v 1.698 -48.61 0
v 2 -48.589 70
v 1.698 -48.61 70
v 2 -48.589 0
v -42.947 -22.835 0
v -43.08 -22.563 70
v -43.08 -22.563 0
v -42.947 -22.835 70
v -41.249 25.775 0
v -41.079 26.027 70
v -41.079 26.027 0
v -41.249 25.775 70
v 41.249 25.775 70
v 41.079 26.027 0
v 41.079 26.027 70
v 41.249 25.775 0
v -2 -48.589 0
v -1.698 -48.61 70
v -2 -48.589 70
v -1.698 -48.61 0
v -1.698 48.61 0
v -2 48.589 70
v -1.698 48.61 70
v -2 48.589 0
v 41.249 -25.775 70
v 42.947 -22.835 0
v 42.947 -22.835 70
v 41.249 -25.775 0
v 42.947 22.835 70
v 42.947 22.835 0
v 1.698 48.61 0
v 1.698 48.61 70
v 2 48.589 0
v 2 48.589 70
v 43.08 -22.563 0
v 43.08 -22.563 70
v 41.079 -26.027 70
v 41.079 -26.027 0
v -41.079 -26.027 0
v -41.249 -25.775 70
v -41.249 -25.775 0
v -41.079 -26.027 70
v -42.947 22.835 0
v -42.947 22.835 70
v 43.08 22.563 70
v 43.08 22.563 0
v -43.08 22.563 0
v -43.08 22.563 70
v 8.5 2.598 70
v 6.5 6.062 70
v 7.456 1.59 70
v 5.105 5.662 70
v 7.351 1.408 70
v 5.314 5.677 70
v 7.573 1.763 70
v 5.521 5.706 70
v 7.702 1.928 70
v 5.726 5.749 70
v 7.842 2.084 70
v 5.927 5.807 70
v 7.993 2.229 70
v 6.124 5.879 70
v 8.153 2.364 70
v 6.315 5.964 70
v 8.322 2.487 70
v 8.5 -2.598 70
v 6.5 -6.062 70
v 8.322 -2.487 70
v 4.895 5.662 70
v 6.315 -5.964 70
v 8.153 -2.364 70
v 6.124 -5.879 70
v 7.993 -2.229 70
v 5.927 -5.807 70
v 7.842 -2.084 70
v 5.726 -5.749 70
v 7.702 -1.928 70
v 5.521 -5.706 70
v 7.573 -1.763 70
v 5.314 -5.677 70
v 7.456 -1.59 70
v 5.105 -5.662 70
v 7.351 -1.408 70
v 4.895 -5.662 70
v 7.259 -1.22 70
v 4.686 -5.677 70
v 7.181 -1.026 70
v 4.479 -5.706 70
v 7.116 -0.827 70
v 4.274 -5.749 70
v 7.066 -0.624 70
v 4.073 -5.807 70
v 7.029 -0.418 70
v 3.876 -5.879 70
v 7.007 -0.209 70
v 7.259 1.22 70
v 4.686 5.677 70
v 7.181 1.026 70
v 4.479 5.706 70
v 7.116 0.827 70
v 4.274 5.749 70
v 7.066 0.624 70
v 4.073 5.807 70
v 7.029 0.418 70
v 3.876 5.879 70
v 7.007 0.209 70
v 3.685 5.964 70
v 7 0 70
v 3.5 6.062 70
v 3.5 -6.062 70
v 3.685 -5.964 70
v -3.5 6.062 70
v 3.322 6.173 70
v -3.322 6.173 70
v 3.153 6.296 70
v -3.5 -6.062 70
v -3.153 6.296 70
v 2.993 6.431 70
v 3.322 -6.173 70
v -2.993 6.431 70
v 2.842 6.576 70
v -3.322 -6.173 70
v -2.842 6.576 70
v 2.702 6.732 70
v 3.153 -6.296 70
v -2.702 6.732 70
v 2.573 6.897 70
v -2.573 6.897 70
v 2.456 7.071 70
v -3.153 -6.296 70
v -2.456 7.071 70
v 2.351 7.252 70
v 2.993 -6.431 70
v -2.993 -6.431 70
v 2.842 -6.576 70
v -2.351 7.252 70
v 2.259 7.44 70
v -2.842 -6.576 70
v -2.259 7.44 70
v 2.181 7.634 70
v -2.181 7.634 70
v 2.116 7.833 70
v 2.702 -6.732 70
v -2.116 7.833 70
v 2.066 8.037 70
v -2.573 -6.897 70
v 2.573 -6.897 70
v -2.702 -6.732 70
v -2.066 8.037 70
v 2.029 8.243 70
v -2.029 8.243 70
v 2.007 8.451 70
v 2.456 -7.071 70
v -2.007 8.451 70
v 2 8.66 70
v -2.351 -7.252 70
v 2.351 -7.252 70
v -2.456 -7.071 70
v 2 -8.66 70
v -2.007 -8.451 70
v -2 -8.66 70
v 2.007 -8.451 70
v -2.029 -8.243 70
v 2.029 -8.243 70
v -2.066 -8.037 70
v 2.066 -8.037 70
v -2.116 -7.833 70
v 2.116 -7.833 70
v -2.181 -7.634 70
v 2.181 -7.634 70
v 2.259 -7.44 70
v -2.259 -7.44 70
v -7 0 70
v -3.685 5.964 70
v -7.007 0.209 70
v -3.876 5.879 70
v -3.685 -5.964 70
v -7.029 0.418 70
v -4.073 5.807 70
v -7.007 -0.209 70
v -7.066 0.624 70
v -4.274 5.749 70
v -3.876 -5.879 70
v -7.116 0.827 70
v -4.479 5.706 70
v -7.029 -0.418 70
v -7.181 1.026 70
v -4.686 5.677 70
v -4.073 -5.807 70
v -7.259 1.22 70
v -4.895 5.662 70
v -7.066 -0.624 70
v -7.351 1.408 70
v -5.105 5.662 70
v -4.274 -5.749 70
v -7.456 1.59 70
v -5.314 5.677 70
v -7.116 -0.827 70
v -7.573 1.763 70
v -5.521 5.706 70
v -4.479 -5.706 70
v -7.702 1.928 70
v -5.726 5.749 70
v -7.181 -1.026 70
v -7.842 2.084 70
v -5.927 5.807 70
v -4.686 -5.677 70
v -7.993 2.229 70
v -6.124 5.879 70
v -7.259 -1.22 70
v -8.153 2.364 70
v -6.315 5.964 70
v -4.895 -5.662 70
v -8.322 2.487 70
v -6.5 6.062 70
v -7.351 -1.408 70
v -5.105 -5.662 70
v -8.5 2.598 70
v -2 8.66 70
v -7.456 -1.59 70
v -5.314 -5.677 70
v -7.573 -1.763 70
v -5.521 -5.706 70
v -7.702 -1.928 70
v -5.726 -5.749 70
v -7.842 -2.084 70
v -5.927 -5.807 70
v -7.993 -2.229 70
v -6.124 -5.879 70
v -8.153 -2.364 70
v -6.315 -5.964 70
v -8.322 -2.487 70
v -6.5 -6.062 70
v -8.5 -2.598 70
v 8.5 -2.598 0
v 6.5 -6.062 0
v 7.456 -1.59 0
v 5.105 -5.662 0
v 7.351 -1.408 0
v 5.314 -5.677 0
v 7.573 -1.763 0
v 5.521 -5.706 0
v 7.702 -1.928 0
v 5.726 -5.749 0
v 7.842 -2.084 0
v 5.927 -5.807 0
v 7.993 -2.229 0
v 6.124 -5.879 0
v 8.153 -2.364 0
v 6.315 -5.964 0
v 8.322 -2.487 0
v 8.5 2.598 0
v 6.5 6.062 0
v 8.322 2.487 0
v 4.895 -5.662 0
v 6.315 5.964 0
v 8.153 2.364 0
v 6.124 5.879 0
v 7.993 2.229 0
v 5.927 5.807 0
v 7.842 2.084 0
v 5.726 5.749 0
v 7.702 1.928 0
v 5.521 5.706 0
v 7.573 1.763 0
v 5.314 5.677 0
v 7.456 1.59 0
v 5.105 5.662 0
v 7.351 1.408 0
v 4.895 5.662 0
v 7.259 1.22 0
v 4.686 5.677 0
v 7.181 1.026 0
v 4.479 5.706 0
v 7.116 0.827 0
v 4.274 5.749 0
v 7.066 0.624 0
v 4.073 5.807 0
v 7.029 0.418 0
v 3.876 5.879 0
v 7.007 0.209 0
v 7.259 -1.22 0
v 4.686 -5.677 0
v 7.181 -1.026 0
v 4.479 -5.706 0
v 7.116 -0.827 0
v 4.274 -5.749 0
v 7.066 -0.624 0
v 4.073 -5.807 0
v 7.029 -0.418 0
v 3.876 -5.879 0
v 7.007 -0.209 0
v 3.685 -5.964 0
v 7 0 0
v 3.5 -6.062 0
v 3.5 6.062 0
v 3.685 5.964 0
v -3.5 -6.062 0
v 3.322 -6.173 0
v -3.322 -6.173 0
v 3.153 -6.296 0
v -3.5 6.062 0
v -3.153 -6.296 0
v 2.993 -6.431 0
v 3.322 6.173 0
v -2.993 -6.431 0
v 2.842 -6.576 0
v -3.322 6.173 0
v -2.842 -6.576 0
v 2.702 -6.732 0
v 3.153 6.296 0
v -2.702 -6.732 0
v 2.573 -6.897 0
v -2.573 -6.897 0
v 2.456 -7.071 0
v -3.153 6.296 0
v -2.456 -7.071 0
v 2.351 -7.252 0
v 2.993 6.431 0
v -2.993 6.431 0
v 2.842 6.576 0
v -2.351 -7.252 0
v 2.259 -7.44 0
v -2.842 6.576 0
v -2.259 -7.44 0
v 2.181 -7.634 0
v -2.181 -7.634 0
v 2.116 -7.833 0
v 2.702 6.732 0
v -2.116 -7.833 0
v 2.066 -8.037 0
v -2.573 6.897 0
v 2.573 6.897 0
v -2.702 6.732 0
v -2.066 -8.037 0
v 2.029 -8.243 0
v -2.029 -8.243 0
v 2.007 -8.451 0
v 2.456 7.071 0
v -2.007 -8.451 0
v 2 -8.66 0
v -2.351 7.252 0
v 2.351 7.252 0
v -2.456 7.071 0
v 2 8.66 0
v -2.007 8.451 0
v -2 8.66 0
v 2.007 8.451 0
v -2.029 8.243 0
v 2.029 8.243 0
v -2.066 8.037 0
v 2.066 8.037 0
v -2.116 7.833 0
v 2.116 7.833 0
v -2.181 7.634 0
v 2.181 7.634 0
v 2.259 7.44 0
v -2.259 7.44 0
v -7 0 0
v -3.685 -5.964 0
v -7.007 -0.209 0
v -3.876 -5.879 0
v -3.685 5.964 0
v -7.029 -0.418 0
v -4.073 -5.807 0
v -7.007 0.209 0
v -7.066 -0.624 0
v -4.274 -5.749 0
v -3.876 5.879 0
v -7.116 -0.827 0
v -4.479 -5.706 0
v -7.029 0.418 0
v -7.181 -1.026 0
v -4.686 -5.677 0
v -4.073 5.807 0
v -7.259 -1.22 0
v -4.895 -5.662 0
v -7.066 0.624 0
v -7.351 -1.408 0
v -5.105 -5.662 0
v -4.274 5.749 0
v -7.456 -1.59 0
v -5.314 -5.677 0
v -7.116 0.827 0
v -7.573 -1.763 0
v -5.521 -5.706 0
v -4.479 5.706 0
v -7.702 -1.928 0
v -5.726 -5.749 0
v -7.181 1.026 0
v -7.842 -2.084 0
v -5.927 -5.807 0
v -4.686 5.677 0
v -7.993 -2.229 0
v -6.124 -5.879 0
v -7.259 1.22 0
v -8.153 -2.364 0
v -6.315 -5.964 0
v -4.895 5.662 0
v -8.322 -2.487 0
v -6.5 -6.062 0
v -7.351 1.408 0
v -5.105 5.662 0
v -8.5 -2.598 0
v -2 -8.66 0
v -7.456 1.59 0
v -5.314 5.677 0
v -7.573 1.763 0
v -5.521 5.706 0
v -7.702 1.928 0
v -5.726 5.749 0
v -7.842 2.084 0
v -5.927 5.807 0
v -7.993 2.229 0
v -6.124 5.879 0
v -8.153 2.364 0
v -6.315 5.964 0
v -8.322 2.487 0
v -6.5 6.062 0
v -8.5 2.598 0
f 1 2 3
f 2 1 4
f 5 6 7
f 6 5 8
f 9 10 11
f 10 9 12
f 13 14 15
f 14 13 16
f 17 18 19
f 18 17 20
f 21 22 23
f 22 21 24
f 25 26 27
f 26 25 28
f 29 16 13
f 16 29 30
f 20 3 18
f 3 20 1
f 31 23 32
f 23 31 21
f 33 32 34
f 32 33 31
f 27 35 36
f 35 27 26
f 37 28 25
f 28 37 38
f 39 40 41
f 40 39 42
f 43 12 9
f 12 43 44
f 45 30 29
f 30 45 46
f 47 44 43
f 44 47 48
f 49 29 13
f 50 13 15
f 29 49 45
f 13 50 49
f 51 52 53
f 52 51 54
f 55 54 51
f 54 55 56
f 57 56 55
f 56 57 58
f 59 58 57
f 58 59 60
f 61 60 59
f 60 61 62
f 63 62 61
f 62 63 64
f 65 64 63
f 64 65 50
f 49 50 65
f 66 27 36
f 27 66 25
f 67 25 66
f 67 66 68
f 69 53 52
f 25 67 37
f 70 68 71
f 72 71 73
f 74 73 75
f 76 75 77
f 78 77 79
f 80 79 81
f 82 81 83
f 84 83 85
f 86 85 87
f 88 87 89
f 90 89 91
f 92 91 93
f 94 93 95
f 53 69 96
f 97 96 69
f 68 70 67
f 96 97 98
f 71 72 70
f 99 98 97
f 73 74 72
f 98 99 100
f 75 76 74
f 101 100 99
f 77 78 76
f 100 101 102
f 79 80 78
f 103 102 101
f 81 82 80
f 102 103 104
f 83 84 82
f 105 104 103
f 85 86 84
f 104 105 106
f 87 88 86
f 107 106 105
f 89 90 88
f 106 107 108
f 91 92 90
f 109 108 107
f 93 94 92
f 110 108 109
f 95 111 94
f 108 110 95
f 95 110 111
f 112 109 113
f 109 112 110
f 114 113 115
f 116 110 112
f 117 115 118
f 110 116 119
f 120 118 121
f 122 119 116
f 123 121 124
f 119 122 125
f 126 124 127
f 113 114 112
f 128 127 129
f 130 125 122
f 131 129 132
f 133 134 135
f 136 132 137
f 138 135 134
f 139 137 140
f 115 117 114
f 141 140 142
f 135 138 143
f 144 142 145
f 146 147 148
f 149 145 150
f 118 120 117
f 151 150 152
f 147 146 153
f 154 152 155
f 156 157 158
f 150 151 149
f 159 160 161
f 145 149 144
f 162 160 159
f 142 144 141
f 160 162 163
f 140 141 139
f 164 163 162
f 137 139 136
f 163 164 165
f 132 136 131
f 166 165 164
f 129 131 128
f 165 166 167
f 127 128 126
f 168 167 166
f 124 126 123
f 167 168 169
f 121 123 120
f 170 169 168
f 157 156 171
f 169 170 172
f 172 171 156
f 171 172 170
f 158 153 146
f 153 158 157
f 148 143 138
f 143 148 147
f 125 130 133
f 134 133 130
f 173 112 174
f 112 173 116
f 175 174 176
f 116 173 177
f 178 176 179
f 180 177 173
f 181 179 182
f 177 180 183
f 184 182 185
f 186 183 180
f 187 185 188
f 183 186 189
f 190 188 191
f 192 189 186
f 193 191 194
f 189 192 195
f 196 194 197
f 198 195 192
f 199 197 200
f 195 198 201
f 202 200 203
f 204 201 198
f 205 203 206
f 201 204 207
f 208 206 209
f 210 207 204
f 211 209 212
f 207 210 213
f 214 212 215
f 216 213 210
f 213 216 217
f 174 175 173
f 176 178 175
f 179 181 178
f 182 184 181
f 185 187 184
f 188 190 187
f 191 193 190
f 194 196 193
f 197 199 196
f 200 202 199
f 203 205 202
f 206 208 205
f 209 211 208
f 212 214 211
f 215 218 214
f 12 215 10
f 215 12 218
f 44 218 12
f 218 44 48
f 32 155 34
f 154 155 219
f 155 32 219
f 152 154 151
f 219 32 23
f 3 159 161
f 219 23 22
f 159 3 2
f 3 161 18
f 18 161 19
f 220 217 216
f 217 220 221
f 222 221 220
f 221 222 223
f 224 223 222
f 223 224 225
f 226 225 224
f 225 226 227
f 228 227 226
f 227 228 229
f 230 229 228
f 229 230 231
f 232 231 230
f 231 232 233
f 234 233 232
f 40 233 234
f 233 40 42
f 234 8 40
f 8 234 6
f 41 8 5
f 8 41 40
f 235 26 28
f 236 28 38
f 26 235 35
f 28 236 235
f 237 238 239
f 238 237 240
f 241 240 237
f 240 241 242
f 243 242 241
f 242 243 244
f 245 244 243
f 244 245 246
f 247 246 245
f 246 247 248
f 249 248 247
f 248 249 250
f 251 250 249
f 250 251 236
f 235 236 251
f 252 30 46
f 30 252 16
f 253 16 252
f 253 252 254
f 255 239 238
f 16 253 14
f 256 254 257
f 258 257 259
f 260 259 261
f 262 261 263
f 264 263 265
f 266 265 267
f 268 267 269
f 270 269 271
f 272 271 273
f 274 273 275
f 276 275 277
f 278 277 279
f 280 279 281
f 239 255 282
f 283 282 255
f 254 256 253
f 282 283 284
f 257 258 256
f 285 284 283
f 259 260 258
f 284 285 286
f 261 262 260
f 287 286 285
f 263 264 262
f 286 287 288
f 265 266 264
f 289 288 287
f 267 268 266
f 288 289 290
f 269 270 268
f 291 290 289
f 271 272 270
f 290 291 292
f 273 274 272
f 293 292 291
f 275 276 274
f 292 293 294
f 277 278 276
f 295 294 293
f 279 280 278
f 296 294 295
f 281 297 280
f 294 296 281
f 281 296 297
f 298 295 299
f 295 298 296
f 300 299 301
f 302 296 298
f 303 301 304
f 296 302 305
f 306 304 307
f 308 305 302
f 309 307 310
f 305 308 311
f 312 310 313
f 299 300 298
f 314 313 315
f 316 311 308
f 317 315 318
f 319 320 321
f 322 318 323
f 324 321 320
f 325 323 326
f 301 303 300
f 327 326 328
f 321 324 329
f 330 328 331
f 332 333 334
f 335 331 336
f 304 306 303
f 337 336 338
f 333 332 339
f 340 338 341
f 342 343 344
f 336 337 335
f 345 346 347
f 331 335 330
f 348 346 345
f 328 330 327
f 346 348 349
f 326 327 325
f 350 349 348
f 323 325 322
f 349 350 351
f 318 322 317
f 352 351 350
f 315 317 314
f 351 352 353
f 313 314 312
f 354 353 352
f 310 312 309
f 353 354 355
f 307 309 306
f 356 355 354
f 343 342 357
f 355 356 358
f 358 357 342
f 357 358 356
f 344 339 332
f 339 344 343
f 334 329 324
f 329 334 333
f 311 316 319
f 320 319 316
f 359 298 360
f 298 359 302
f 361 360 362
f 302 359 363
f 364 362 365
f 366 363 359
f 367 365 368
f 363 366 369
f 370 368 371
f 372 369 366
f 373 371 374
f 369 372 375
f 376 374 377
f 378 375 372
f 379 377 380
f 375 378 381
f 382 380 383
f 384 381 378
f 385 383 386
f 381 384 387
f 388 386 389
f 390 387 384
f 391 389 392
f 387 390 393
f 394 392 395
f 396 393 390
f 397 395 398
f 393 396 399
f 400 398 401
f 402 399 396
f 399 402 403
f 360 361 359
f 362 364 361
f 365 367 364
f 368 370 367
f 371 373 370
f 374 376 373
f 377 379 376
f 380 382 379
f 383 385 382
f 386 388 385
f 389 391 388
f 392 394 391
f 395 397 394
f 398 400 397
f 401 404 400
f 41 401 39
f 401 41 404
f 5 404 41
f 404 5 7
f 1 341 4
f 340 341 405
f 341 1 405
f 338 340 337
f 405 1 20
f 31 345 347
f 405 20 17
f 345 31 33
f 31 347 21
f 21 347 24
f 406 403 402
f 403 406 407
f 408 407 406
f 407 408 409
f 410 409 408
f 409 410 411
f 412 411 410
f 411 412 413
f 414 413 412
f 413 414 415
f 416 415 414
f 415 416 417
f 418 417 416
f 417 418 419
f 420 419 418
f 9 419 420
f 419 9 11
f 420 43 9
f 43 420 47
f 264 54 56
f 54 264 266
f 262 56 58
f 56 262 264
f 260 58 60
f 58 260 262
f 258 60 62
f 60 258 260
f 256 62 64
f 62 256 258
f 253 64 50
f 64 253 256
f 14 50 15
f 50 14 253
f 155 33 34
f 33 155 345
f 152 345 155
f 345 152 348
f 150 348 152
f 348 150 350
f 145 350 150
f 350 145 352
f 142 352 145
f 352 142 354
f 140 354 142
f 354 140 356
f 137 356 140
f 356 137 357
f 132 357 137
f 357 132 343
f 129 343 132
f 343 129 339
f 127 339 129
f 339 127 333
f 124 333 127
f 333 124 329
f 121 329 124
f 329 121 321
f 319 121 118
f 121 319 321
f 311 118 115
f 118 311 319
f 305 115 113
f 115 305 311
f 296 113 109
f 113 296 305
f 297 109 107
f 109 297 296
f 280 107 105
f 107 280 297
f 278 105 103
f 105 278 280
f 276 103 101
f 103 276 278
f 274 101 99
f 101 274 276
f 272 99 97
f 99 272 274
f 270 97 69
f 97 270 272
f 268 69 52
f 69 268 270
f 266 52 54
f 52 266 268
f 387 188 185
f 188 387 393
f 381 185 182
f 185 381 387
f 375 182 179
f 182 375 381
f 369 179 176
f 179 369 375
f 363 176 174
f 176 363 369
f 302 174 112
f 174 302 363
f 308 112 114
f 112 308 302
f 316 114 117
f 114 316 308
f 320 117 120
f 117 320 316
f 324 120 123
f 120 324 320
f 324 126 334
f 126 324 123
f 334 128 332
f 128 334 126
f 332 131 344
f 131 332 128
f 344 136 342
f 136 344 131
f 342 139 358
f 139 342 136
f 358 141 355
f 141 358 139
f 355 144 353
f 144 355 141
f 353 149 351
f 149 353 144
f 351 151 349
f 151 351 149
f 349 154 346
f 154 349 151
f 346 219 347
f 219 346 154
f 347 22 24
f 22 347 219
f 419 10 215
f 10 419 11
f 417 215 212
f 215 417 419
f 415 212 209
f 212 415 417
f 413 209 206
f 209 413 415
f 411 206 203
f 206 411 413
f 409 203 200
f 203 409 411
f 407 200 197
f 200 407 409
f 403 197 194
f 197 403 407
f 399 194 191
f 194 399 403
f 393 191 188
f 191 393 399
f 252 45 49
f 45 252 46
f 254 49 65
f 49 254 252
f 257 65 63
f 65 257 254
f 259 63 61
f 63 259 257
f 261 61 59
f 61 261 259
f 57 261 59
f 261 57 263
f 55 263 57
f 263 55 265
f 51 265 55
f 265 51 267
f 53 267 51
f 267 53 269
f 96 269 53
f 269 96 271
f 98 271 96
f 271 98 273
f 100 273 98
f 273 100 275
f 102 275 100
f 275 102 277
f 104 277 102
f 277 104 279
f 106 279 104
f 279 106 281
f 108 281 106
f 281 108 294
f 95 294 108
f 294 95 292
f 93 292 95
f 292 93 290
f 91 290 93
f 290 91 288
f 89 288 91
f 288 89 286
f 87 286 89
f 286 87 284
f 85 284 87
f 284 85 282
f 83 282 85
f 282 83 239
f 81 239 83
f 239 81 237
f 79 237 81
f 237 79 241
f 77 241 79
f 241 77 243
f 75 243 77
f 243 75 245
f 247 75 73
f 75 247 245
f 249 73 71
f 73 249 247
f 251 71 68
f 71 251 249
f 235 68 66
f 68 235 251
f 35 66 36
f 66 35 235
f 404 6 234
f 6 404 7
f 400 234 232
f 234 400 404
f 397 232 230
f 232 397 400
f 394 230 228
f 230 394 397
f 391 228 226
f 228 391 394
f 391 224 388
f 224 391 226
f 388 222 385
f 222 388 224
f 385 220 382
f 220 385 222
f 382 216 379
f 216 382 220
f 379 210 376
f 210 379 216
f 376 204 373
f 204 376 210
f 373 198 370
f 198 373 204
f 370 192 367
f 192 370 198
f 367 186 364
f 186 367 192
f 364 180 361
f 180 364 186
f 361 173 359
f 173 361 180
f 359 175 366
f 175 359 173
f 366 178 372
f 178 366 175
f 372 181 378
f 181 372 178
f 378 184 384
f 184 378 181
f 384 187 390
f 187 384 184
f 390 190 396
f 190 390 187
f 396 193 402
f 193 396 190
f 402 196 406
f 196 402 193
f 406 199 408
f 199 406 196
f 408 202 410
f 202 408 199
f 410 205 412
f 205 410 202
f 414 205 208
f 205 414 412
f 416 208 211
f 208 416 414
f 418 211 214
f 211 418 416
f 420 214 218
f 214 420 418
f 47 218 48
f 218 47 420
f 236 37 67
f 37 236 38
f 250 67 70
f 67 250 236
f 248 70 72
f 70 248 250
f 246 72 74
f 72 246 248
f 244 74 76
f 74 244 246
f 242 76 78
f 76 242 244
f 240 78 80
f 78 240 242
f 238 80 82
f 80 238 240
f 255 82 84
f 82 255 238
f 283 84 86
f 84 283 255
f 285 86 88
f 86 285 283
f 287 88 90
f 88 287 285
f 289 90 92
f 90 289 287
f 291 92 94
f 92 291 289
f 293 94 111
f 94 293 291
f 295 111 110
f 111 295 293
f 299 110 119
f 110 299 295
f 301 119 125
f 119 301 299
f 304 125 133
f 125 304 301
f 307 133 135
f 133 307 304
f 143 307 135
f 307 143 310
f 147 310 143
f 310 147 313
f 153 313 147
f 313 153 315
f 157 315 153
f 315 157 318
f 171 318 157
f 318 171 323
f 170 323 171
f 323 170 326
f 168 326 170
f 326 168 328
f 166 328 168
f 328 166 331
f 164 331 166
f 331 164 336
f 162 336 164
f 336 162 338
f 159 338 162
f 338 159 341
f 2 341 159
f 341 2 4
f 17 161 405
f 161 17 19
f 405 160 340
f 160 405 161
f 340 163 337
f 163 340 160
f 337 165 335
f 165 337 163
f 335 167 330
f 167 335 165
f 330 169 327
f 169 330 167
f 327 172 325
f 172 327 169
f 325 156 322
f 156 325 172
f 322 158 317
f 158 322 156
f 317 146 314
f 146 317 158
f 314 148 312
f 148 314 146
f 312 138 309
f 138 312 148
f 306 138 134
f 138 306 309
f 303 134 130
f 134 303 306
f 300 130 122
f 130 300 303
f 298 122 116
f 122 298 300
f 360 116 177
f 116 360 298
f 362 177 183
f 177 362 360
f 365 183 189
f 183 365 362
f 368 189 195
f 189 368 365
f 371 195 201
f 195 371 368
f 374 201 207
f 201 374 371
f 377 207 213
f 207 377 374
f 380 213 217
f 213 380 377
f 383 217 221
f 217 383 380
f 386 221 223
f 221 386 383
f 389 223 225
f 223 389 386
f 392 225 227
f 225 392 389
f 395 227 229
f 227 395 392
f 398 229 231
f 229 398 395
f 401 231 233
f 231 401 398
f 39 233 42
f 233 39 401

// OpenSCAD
/*
 * Mixit Box Divider
 *
 * Author: Pavel Rampas
 * Version: 1.0.0 (Changelog is at the bottom)
 * License: CC BY-SA 4.0 [https://creativecommons.org/licenses/by-sa/4.0/]
 * Link: https://github.com/pavelrampas/openscad-models
 *
 * OpenSCAD version: 2021.01
 *
 * Instructions:
 * Set up parameters, render and print.
 *
 * Height is layer.
 * Thickness is perimeter.
 */

// Parameters
//------------------------------------------------------------------------------

$fn = $preview ? 30 : 90;

height = 70;

// Parameters that don't need to be changed
//------------------------------------------------------------------------------

wallThickness = 0.86; // ideal for 0.4 nozzle
innerD = 99;

// Code
//------------------------------------------------------------------------------

wallThicknessD = wallThickness * 2;

difference() {
    cylinder(
        h = height,
        d1 = innerD - wallThicknessD,
        d2 = innerD - wallThicknessD
    );
    linear_extrude(height = height) {
        offset(3) {
            difference() {
                circle(d = innerD);
                for (a = [1:3]) {
                    rotate([0, 0, 60 * a]) {
                        square([10, innerD], true);
                    }
                }
            }
        }
    }
}

// Functions
//------------------------------------------------------------------------------


// Modules
//------------------------------------------------------------------------------


// Changelog
//------------------------------------------------------------------------------

// [1.0.0]:
// Initial release.
